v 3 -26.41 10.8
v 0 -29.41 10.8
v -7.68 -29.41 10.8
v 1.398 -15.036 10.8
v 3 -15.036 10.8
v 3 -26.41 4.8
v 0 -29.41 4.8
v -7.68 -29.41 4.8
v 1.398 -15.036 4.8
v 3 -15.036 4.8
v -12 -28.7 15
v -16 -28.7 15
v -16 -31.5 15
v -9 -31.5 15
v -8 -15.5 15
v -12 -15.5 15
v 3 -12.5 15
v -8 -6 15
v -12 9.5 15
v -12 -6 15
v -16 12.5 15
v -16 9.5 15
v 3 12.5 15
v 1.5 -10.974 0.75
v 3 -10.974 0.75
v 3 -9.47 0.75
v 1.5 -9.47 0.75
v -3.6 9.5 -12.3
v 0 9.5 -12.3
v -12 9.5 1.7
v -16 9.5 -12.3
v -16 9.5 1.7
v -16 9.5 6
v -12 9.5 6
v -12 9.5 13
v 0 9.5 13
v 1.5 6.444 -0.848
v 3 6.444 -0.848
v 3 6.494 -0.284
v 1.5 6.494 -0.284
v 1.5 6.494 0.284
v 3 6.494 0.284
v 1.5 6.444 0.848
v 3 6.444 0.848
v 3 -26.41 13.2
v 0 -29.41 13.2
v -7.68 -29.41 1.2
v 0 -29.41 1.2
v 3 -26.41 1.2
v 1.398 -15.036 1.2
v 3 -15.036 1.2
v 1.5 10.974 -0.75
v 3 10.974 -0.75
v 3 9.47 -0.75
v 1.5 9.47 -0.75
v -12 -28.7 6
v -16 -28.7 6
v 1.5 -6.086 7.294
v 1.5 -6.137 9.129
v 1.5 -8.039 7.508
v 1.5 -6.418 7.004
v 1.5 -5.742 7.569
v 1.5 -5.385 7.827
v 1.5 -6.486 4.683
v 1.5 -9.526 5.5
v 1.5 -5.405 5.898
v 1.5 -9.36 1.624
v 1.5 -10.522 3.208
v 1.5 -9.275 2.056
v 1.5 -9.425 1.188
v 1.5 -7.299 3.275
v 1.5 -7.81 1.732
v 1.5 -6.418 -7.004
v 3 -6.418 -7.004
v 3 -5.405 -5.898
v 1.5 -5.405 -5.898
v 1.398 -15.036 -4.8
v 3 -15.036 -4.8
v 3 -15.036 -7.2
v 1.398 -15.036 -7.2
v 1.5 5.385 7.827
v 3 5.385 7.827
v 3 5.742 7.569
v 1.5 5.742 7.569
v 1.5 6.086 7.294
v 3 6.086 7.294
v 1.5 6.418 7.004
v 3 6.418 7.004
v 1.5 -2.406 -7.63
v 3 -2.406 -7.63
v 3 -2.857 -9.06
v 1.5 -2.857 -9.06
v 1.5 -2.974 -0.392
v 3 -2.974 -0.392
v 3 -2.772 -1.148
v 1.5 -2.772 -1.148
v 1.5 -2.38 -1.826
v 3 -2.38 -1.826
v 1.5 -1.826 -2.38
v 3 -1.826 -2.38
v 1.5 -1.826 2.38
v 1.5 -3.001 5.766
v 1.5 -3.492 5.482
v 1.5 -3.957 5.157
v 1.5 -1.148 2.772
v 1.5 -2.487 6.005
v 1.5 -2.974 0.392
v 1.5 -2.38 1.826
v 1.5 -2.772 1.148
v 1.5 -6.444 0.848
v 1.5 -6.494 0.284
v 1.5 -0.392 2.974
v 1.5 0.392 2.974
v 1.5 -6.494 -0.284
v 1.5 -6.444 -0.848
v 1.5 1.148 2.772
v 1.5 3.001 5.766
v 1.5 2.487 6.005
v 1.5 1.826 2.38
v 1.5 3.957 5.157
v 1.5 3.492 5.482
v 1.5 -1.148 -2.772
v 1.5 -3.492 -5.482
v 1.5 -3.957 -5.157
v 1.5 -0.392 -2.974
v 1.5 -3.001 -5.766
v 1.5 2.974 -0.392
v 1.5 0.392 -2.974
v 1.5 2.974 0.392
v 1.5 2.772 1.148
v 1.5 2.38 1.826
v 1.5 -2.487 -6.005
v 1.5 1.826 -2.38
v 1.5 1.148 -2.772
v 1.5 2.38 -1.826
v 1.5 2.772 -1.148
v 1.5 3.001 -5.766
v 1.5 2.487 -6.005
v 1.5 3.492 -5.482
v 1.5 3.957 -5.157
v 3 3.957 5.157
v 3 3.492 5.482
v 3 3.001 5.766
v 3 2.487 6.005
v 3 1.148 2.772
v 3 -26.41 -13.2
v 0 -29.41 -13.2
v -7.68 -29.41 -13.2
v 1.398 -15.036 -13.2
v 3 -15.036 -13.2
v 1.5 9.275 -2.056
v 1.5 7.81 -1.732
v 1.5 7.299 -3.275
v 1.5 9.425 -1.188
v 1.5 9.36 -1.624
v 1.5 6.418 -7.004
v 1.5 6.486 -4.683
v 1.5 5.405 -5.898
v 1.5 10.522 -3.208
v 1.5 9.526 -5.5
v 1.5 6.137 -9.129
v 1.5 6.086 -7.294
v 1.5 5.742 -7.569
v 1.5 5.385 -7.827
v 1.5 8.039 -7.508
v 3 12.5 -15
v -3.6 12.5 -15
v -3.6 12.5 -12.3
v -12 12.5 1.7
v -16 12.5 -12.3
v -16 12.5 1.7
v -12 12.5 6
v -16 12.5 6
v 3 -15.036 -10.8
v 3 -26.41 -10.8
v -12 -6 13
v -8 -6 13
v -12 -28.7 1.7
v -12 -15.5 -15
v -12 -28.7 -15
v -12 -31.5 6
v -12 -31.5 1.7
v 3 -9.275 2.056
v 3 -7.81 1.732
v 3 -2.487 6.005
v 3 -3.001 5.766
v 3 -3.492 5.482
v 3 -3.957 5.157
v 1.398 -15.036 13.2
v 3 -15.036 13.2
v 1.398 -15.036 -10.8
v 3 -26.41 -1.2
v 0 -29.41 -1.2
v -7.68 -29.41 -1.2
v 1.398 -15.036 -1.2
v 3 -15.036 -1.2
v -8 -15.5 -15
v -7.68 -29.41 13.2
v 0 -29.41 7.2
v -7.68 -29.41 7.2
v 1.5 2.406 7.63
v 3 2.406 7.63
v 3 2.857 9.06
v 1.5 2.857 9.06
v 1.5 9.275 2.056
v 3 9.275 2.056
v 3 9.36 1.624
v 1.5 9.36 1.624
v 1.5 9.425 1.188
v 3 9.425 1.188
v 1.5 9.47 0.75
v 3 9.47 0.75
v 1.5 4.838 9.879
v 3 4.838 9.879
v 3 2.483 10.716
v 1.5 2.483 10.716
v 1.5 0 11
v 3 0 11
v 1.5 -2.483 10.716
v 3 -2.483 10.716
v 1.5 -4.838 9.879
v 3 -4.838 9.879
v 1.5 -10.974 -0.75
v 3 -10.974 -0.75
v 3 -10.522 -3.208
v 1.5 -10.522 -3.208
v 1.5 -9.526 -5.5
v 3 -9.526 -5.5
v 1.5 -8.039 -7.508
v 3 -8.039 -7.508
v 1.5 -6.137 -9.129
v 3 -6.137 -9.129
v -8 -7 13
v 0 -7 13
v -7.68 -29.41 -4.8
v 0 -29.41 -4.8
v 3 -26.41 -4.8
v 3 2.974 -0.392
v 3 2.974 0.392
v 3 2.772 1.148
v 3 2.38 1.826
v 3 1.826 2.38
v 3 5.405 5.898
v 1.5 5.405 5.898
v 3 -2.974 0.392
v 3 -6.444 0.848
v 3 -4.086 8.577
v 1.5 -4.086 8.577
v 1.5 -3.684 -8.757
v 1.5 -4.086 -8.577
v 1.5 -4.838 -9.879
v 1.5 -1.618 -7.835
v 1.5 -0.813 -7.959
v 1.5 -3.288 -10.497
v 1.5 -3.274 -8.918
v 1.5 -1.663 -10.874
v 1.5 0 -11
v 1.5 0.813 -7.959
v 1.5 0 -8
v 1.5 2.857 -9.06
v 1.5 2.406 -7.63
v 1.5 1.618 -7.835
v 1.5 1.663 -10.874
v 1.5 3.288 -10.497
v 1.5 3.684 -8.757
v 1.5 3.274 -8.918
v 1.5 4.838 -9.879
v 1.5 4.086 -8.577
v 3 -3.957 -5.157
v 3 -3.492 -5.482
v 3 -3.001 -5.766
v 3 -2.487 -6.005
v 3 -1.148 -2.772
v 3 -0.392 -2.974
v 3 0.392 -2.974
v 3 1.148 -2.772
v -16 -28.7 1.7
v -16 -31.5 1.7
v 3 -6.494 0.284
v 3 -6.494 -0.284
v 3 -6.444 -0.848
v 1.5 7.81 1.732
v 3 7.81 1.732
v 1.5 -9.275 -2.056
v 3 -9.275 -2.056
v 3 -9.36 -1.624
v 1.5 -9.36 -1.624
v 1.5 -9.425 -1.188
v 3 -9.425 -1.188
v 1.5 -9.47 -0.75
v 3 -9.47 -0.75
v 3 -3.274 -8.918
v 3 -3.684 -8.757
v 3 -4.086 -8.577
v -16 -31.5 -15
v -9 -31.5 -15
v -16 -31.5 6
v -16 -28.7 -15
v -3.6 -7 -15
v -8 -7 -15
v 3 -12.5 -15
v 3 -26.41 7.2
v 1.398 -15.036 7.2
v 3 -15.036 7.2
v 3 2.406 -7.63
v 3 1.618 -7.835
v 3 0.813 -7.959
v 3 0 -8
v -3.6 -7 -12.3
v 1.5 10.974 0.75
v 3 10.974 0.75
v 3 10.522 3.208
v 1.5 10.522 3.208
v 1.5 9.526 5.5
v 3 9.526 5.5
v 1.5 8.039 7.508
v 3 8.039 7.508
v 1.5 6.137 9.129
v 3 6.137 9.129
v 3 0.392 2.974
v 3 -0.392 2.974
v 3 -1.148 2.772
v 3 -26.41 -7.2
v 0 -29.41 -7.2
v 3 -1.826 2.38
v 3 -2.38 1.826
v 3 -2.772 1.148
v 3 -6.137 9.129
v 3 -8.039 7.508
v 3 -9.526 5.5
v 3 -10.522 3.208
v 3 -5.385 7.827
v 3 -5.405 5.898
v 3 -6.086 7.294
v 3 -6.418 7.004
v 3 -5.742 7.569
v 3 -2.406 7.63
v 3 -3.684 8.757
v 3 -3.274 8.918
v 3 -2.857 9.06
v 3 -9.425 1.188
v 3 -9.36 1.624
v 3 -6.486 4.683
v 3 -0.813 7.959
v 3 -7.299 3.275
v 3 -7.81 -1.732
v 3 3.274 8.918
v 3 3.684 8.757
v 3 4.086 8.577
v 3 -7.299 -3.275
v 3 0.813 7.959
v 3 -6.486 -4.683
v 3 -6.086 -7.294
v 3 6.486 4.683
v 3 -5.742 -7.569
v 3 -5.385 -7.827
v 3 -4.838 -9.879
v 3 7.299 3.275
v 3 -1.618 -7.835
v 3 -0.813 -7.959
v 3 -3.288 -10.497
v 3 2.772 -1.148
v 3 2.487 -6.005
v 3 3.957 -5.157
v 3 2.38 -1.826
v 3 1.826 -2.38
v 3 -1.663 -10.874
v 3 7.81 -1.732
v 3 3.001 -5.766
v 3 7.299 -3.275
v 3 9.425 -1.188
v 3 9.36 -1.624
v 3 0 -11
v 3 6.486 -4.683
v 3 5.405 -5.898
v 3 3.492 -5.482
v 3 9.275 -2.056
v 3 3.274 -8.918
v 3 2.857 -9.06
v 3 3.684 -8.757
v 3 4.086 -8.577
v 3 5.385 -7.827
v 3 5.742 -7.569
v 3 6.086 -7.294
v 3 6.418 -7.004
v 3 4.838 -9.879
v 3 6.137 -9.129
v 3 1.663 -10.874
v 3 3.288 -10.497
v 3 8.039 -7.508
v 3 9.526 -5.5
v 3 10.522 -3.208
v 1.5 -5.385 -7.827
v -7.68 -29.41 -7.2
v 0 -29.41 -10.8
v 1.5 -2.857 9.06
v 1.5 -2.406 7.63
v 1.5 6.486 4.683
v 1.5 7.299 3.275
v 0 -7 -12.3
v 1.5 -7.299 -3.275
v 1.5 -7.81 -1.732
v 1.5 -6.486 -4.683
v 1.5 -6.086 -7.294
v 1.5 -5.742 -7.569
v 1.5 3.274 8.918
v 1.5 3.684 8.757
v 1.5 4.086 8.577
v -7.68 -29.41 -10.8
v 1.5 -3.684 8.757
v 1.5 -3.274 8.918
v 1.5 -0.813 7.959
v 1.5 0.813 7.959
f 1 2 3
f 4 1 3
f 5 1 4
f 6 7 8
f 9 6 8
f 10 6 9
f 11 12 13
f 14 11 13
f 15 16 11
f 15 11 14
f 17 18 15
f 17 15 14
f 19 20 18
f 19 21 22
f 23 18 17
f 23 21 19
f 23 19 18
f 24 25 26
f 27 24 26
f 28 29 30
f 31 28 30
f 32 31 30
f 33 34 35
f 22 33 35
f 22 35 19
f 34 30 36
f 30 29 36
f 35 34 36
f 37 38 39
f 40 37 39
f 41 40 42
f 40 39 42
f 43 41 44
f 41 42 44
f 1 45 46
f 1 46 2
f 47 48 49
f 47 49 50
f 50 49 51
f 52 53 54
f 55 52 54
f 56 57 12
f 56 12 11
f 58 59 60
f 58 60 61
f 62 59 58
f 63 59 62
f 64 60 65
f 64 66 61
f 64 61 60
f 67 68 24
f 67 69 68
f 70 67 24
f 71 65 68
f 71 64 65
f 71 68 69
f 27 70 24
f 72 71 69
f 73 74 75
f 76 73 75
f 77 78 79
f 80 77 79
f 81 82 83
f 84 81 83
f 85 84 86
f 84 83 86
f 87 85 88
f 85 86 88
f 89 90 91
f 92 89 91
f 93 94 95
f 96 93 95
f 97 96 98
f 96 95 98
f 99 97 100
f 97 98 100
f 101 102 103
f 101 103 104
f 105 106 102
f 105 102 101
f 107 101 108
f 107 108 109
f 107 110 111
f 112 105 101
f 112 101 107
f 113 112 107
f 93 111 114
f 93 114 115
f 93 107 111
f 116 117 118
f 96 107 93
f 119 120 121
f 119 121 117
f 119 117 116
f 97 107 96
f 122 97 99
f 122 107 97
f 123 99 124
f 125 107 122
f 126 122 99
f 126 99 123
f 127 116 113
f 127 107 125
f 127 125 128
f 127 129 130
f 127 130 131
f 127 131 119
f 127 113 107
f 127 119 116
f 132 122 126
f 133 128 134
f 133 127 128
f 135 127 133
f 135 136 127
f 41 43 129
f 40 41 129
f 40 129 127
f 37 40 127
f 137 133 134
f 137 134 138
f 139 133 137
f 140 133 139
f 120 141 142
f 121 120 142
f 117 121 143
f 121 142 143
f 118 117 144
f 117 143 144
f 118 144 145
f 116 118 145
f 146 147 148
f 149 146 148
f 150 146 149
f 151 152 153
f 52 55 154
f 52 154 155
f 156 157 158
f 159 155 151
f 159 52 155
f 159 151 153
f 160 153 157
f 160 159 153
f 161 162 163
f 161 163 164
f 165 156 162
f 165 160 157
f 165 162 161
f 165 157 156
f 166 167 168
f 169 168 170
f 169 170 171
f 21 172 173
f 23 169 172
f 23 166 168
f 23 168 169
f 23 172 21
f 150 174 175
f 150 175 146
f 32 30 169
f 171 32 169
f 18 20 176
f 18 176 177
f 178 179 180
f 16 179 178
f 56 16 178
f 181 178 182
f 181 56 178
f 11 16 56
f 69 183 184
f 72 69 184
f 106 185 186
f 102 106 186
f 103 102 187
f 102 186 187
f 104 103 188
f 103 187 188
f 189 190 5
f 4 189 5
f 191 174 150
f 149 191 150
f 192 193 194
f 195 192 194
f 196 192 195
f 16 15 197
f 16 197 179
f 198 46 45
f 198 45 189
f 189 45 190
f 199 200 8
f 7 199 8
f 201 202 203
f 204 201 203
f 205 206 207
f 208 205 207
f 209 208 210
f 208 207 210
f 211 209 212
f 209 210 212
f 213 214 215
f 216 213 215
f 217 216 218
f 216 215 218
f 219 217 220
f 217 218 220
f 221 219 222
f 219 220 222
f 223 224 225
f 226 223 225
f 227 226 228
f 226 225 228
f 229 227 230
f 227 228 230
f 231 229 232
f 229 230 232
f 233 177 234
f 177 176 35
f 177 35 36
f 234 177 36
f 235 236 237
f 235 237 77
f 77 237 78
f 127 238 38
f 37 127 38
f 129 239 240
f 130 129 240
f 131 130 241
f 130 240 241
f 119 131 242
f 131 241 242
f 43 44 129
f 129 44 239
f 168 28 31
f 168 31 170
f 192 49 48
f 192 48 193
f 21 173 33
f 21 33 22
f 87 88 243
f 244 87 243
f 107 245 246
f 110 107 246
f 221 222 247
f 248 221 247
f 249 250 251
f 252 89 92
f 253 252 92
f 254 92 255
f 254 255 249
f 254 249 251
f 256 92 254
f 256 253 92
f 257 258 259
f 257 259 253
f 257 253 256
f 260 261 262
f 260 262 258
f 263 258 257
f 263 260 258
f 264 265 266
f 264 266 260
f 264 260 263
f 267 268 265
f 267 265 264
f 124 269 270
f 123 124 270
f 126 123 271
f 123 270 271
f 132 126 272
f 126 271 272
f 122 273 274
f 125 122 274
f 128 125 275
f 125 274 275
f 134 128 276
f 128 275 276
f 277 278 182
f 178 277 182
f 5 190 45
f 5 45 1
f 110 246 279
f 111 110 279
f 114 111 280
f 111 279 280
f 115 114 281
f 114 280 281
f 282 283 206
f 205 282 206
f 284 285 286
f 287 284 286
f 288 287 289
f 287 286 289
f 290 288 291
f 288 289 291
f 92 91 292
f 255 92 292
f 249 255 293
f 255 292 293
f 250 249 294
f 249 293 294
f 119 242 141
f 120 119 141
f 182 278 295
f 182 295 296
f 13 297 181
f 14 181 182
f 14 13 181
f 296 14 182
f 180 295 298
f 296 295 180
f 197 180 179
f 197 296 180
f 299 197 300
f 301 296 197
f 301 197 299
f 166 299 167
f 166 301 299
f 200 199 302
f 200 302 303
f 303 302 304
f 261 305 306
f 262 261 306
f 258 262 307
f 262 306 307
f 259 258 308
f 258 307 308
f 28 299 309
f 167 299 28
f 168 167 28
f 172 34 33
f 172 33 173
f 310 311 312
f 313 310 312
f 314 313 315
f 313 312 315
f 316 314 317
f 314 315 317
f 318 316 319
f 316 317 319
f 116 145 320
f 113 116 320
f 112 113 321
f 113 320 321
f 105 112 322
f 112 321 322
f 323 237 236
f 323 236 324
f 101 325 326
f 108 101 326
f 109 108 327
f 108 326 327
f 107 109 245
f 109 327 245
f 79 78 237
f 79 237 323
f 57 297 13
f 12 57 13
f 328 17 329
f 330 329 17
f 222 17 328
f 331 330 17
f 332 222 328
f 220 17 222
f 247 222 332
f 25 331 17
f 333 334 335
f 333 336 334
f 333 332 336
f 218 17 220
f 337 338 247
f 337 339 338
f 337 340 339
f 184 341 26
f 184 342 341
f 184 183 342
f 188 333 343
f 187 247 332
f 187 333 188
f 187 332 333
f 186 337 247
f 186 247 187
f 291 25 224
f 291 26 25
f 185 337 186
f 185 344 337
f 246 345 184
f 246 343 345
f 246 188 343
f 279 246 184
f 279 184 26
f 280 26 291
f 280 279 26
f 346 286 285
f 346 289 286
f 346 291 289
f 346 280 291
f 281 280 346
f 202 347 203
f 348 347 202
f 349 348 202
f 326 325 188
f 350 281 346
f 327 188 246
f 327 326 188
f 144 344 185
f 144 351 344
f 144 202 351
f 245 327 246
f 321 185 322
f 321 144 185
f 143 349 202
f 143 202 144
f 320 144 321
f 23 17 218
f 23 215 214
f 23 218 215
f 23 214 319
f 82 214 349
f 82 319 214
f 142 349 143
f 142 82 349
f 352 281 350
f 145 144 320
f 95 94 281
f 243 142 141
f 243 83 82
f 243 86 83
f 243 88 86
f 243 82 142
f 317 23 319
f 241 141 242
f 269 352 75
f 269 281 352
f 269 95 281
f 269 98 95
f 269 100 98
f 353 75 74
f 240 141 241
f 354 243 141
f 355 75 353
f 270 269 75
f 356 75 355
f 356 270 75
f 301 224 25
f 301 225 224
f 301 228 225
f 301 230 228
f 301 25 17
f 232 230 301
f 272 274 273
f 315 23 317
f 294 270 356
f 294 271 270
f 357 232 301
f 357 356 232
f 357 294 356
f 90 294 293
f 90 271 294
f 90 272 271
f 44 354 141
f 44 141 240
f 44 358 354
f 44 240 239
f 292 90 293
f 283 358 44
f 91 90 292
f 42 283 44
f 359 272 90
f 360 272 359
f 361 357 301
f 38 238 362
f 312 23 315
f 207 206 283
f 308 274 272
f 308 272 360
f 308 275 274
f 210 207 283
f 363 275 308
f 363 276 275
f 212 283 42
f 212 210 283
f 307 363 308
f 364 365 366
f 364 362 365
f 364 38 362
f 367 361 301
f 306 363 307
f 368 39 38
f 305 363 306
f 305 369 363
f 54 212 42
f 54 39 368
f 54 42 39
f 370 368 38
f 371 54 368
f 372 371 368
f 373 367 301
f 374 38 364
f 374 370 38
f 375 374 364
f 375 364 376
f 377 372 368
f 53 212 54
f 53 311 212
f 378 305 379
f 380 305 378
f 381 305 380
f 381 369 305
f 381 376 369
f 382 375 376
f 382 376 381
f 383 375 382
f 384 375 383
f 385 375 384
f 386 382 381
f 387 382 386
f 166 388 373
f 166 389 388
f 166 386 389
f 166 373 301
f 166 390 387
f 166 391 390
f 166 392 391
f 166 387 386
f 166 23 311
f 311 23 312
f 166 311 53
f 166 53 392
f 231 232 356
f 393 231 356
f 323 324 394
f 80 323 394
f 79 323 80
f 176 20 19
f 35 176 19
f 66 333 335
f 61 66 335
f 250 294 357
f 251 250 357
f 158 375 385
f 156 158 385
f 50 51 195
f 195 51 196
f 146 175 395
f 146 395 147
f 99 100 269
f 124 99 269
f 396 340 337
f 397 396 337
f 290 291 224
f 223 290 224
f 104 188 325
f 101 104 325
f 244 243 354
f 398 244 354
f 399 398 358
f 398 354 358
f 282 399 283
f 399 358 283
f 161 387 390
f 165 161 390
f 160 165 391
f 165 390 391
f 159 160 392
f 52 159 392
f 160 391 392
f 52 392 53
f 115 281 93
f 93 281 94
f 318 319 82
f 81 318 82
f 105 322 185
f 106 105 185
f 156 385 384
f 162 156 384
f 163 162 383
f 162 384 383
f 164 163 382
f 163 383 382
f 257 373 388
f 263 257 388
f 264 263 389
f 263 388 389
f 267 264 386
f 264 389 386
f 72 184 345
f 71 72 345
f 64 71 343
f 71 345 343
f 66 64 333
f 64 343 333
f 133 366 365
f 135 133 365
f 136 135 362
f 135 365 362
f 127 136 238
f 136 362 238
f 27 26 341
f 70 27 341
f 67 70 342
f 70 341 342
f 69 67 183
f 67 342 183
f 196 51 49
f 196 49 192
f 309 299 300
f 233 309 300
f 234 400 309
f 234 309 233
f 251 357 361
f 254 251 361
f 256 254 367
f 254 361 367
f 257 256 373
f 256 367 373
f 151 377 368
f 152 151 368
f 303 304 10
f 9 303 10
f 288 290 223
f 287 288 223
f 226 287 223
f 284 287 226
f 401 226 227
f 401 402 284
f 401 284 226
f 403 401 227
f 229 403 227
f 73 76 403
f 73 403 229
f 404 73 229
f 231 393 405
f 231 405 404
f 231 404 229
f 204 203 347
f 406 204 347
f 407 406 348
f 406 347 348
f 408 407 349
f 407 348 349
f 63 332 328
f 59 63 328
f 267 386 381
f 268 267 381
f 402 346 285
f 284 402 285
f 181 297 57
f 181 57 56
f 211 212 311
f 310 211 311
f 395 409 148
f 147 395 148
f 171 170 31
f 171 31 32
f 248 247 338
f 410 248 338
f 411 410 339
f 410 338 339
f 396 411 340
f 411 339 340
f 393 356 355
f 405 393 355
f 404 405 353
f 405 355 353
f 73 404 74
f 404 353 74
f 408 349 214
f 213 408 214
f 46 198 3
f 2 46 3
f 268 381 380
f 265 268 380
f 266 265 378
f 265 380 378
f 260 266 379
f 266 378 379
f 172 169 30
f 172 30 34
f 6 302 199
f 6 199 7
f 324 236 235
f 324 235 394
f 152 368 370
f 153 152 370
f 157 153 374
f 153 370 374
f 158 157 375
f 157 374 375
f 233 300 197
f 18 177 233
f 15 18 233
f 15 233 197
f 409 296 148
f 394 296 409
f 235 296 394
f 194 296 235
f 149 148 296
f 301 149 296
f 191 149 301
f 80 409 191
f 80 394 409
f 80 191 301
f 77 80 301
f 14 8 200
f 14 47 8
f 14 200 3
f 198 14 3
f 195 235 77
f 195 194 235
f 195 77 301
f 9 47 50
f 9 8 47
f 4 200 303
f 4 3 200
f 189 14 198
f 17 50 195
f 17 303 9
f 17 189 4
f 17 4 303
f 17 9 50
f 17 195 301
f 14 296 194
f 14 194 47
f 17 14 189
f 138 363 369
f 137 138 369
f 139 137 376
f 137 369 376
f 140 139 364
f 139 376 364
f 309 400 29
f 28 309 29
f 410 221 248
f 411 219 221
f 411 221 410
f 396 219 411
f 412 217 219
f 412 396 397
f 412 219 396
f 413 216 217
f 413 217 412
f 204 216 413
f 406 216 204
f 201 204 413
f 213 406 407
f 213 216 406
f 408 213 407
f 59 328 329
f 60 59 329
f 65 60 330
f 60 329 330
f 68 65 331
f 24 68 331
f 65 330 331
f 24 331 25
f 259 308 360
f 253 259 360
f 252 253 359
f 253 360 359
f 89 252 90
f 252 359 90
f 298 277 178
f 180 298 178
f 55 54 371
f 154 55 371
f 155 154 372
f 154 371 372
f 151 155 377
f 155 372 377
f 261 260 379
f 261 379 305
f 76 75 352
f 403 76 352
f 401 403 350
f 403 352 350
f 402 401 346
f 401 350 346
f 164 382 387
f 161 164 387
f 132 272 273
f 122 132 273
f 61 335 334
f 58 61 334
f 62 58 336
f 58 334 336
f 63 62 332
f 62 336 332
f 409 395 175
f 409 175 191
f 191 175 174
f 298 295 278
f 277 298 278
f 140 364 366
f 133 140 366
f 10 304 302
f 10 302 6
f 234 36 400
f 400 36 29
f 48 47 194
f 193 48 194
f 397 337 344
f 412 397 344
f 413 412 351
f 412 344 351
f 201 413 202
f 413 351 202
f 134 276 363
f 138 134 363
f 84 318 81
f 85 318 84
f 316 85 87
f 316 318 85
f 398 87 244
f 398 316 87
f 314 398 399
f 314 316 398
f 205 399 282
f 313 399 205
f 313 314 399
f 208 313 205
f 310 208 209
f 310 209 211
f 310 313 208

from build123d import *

# Parameters (mm, degrees)
SKETCH1_W           = 30
SKETCH1_H           = 25
BOSS_EXTRUDE1_DEPTH = 3
SKETCH2_W           = 9
SKETCH2_H           = 3
SKETCH2_W_2         = 14
BOSS_EXTRUDE2_DEPTH = 16
SKETCH3_W           = 4.3
SKETCH3_H           = 3
BOSS_EXTRUDE3_DEPTH = 12
SKETCH4_W           = 30
SKETCH4_H           = 5.5
BOSS_EXTRUDE4_DEPTH = 8
BOSS_EXTRUDE5_DEPTH = 30
SKETCH7_W           = 4
SKETCH7_H           = 9
SKETCH7_H_2         = 16.7
BOSS_EXTRUDE6_DEPTH = 3
SKETCH9_W           = 12
SKETCH9_H           = 16.5
BOSS_EXTRUDE7_DEPTH = 2
BOSS_EXTRUDE8_REACH = 41.727
SKETCH11_W          = 2.4
SKETCH11_H          = 14.373311352
CHAMFER1_SIZE       = 3
SKETCH12_R          = 3
CUT_EXTRUDE1_DEPTH  = 1.5
SKETCH13_W          = 2.7
SKETCH13_H          = 19.5
BOSS_EXTRUDE9_DEPTH = 3.6
SKETCH14_W          = 4
SKETCH14_H          = 1
SKETCH14_H_2        = 0.2
CUT_EXTRUDE2_DEPTH  = 47.349217901


with BuildPart() as part:
    # Sketch1 → Boss-Extrude1 (new body)
    with BuildSketch(Plane(origin=(0, 0, 0), x_dir=(0, 0, -1), z_dir=(1, 0, 0))):
        Rectangle(SKETCH1_W, SKETCH1_H)
    extrude(amount=BOSS_EXTRUDE1_DEPTH)

    # Sketch2 → Boss-Extrude2 (add)
    with BuildSketch(Plane.ZY):
        with Locations((10.5, 11)):
            Rectangle(SKETCH2_W, SKETCH2_H)
        with Locations((-5.3, 11)):
            Rectangle(SKETCH2_W_2, SKETCH2_H)
    extrude(amount=BOSS_EXTRUDE2_DEPTH)

    # Sketch3 → Boss-Extrude3 (add)
    with BuildSketch(Plane.ZY):
        with Locations((3.85, 11)):
            Rectangle(SKETCH3_W, SKETCH3_H)
    extrude(amount=BOSS_EXTRUDE3_DEPTH)

    # Sketch4 → Boss-Extrude4 (add)
    with BuildSketch(Plane.ZY):
        with Locations((0, -9.75)):
            Rectangle(SKETCH4_W, SKETCH4_H)
    extrude(amount=BOSS_EXTRUDE4_DEPTH)

    # Sketch5 → Boss-Extrude5 (add)
    with BuildSketch(Plane.XY.offset(15)):
        Polygon((-12, -31.5), (-9, -31.5), (3, -12.5), (-8, -12.5), (-8, -15.5), (-12, -15.5), align=None)
    extrude(amount=-BOSS_EXTRUDE5_DEPTH)

    # Sketch7 → Boss-Extrude6 (add)
    with BuildSketch(Plane.XZ.offset(31.5)):
        with Locations((-14, 10.5)):
            Rectangle(SKETCH7_W, SKETCH7_H)
        with Locations((-14, -6.65)):
            Rectangle(SKETCH7_W, SKETCH7_H_2)
    extrude(amount=-BOSS_EXTRUDE6_DEPTH)

    # Sketch9 → Boss-Extrude7 (add)
    with BuildSketch(Plane.XY.offset(15)):
        with Locations((-6, 1.25)):
            Rectangle(SKETCH9_W, SKETCH9_H)
    extrude(amount=-BOSS_EXTRUDE7_DEPTH)

    # Boss-Extrude8: up to this plane
    boss_extrude8_end = Plane(origin=(-9, -31.5, -39.207436874), z_dir=(0.8454889030309711, -0.5339929913879816, 0))
    # Sketch11 → Boss-Extrude8 (add, up to the surface)
    with BuildSketch(Plane(origin=(3, 0, 0), x_dir=(0, 0, -1), z_dir=(1, 0, 0)), mode=Mode.PRIVATE) as boss_extrude8_sk1:
        with Locations((-12, -22.223122385)):
            Rectangle(SKETCH11_W, SKETCH11_H)
    boss_extrude8_tool1 = split(extrude(boss_extrude8_sk1.sketch, amount=-BOSS_EXTRUDE8_REACH, mode=Mode.PRIVATE), bisect_by=boss_extrude8_end, keep=Keep.BOTH, mode=Mode.PRIVATE)
    add(boss_extrude8_tool1.solids().sort_by_distance((3, -22.223122, 12))[0])
    # Sketch11 → Boss-Extrude8 (add, up to the surface)
    with BuildSketch(Plane(origin=(3, 0, 0), x_dir=(0, 0, -1), z_dir=(1, 0, 0)), mode=Mode.PRIVATE) as boss_extrude8_sk2:
        with Locations((-6, -22.223122385)):
            Rectangle(SKETCH11_W, SKETCH11_H)
    boss_extrude8_tool2 = split(extrude(boss_extrude8_sk2.sketch, amount=-BOSS_EXTRUDE8_REACH, mode=Mode.PRIVATE), bisect_by=boss_extrude8_end, keep=Keep.BOTH, mode=Mode.PRIVATE)
    add(boss_extrude8_tool2.solids().sort_by_distance((3, -22.223122, 6))[0])
    # Sketch11 → Boss-Extrude8 (add, up to the surface)
    with BuildSketch(Plane(origin=(3, 0, 0), x_dir=(0, 0, -1), z_dir=(1, 0, 0)), mode=Mode.PRIVATE) as boss_extrude8_sk3:
        with Locations((0, -22.223122385)):
            Rectangle(SKETCH11_W, SKETCH11_H)
    boss_extrude8_tool3 = split(extrude(boss_extrude8_sk3.sketch, amount=-BOSS_EXTRUDE8_REACH, mode=Mode.PRIVATE), bisect_by=boss_extrude8_end, keep=Keep.BOTH, mode=Mode.PRIVATE)
    add(boss_extrude8_tool3.solids().sort_by_distance((3, -22.223122, 0))[0])
    # Sketch11 → Boss-Extrude8 (add, up to the surface)
    with BuildSketch(Plane(origin=(3, 0, 0), x_dir=(0, 0, -1), z_dir=(1, 0, 0)), mode=Mode.PRIVATE) as boss_extrude8_sk4:
        with Locations((6, -22.223122385)):
            Rectangle(SKETCH11_W, SKETCH11_H)
    boss_extrude8_tool4 = split(extrude(boss_extrude8_sk4.sketch, amount=-BOSS_EXTRUDE8_REACH, mode=Mode.PRIVATE), bisect_by=boss_extrude8_end, keep=Keep.BOTH, mode=Mode.PRIVATE)
    add(boss_extrude8_tool4.solids().sort_by_distance((3, -22.223122, -6))[0])
    # Sketch11 → Boss-Extrude8 (add, up to the surface)
    with BuildSketch(Plane(origin=(3, 0, 0), x_dir=(0, 0, -1), z_dir=(1, 0, 0)), mode=Mode.PRIVATE) as boss_extrude8_sk5:
        with Locations((12, -22.223122385)):
            Rectangle(SKETCH11_W, SKETCH11_H)
    boss_extrude8_tool5 = split(extrude(boss_extrude8_sk5.sketch, amount=-BOSS_EXTRUDE8_REACH, mode=Mode.PRIVATE), bisect_by=boss_extrude8_end, keep=Keep.BOTH, mode=Mode.PRIVATE)
    add(boss_extrude8_tool5.solids().sort_by_distance((3, -22.223122, -12))[0])

    # Chamfer1
    chamfer1_edges = [part.edges().sort_by_distance(p)[0] for p in [
        (3, -29.409778061, 12),
        (3, -29.409778061, 6),
        (3, -29.409778061, 0),
        (3, -29.409778061, -6),
        (3, -29.409778061, -12),
    ]]
    chamfer(chamfer1_edges, length=CHAMFER1_SIZE)

    # Sketch12 → Cut-Extrude1 (cut)
    with BuildSketch(Plane(origin=(3, 0, 0), x_dir=(0, 0, -1), z_dir=(1, 0, 0))):
        with BuildLine():
            Line((-0.75, 9.470348462), (-0.75, 10.974402034))
            ThreePointArc((-0.75, 10.974402034), (-5.5, 9.526279442), (-9.129110953, 6.13672007))
            Line((-9.129110953, 6.13672007), (-7.826562351, 5.384693284))
            ThreePointArc((-7.826562351, 5.384693284), (-7.433328979, 5.915709618), (-7.0041347, 6.418106972))
            ThreePointArc((-7.0041347, 6.418106972), (-4.75, 8.227241336), (-2.056176332, 9.274812068))
            ThreePointArc((-2.056176332, 9.274812068), (-1.406490321, 9.39530654), (-0.75, 9.470348462))
        make_face()
        with BuildLine():
            Line((-8.576562351, 4.085655178), (-9.879110953, 4.837681964))
            ThreePointArc((-9.879110953, 4.837681964), (-11, 0), (-9.879110953, -4.837681964))
            Line((-9.879110953, -4.837681964), (-8.576562351, -4.085655178))
            ThreePointArc((-8.576562351, -4.085655178), (-8.8398193, -3.479596922), (-9.060311032, -2.856705095))
            ThreePointArc((-9.060311032, -2.856705095), (-9.5, 0), (-9.060311032, 2.856705095))
            ThreePointArc((-9.060311032, 2.856705095), (-8.8398193, 3.479596922), (-8.576562351, 4.085655178))
        make_face()
        with BuildLine():
            Line((-7.826562351, -5.384693284), (-9.129110953, -6.13672007))
            ThreePointArc((-9.129110953, -6.13672007), (-5.5, -9.526279442), (-0.75, -10.974402034))
            Line((-0.75, -10.974402034), (-0.75, -9.470348462))
            ThreePointArc((-0.75, -9.470348462), (-1.406490321, -9.39530654), (-2.056176332, -9.274812068))
            ThreePointArc((-2.056176332, -9.274812068), (-4.75, -8.227241336), (-7.0041347, -6.418106972))
            ThreePointArc((-7.0041347, -6.418106972), (-7.433328979, -5.915709618), (-7.826562351, -5.384693284))
        make_face()
        with BuildLine():
            ThreePointArc((0.75, -10.974402034), (5.5, -9.526279442), (9.129110953, -6.13672007))
            Line((9.129110953, -6.13672007), (7.826562351, -5.384693284))
            ThreePointArc((7.826562351, -5.384693284), (7.433328979, -5.915709618), (7.0041347, -6.418106972))
            ThreePointArc((7.0041347, -6.418106972), (4.75, -8.227241336), (2.056176332, -9.274812068))
            ThreePointArc((2.056176332, -9.274812068), (1.406490321, -9.39530654), (0.75, -9.470348462))
            Line((0.75, -9.470348462), (0.75, -10.974402034))
        make_face()
        with BuildLine():
            ThreePointArc((11, 0), (10.716114512, 2.482919604), (9.879110953, 4.837681964))
            Line((9.879110953, 4.837681964), (8.576562351, 4.085655178))
            ThreePointArc((8.576562351, 4.085655178), (8.8398193, 3.479596922), (9.060311032, 2.856705095))
            ThreePointArc((9.060311032, 2.856705095), (9.389434349, 1.445172169), (9.5, 0))
            ThreePointArc((9.5, 0), (9.389434349, -1.445172169), (9.060311032, -2.856705095))
            ThreePointArc((9.060311032, -2.856705095), (8.8398193, -3.479596922), (8.576562351, -4.085655178))
            Line((8.576562351, -4.085655178), (9.879110953, -4.837681964))
            ThreePointArc((9.879110953, -4.837681964), (10.716114512, -2.482919604), (11, 0))
        make_face()
        with BuildLine():
            ThreePointArc((9.129110953, 6.13672007), (5.5, 9.526279442), (0.75, 10.974402034))
            Line((0.75, 10.974402034), (0.75, 9.470348462))
            ThreePointArc((0.75, 9.470348462), (1.406490321, 9.39530654), (2.056176332, 9.274812068))
            ThreePointArc((2.056176332, 9.274812068), (4.75, 8.227241336), (7.0041347, 6.418106972))
            ThreePointArc((7.0041347, 6.418106972), (7.433328979, 5.915709618), (7.826562351, 5.384693284))
            Line((7.826562351, 5.384693284), (9.129110953, 6.13672007))
        make_face()
        with BuildLine():
            Line((-1.731516912, 7.810368057), (-2.056176332, 9.274812068))
            ThreePointArc((-2.056176332, 9.274812068), (-4.75, 8.227241336), (-7.0041347, 6.418106972))
            Line((-7.0041347, 6.418106972), (-5.898218694, 5.404721661))
            ThreePointArc((-5.898218694, 5.404721661), (-4, 6.92820323), (-1.731516912, 7.810368057))
        make_face()
        with BuildLine():
            Line((-7.629735606, 2.405646396), (-9.060311032, 2.856705095))
            ThreePointArc((-9.060311032, 2.856705095), (-9.5, 0), (-9.060311032, -2.856705095))
            Line((-9.060311032, -2.856705095), (-7.629735606, -2.405646396))
            ThreePointArc((-7.629735606, -2.405646396), (-8, 0), (-7.629735606, 2.405646396))
        make_face()
        with BuildLine():
            Line((-5.898218694, -5.404721661), (-7.0041347, -6.418106972))
            ThreePointArc((-7.0041347, -6.418106972), (-4.75, -8.227241336), (-2.056176332, -9.274812068))
            Line((-2.056176332, -9.274812068), (-1.731516912, -7.810368057))
            ThreePointArc((-1.731516912, -7.810368057), (-4, -6.92820323), (-5.898218694, -5.404721661))
        make_face()
        with BuildLine():
            ThreePointArc((2.056176332, -9.274812068), (4.75, -8.227241336), (7.0041347, -6.418106972))
            Line((7.0041347, -6.418106972), (5.898218694, -5.404721661))
            ThreePointArc((5.898218694, -5.404721661), (4, -6.92820323), (1.731516912, -7.810368057))
            Line((1.731516912, -7.810368057), (2.056176332, -9.274812068))
        make_face()
        with BuildLine():
            ThreePointArc((9.5, 0), (9.389434349, 1.445172169), (9.060311032, 2.856705095))
            Line((9.060311032, 2.856705095), (7.629735606, 2.405646396))
            ThreePointArc((7.629735606, 2.405646396), (7.906892084, 1.21698709), (8, 0))
            ThreePointArc((8, 0), (7.906892084, -1.21698709), (7.629735606, -2.405646396))
            Line((7.629735606, -2.405646396), (9.060311032, -2.856705095))
            ThreePointArc((9.060311032, -2.856705095), (9.389434349, -1.445172169), (9.5, 0))
        make_face()
        with BuildLine():
            ThreePointArc((7.0041347, 6.418106972), (4.75, 8.227241336), (2.056176332, 9.274812068))
            Line((2.056176332, 9.274812068), (1.731516912, 7.810368057))
            ThreePointArc((1.731516912, 7.810368057), (4, 6.92820323), (5.898218694, 5.404721661))
            Line((5.898218694, 5.404721661), (7.0041347, 6.418106972))
        make_face()
        with BuildLine():
            Line((-2.380060021, 1.826284287), (-5.156796712, 3.956949289))
            ThreePointArc((-5.156796712, 3.956949289), (-5.629165125, 3.25), (-6.005216961, 2.48744231))
            Line((-6.005216961, 2.48744231), (-2.771638598, 1.148050297))
            ThreePointArc((-2.771638598, 1.148050297), (-2.598076211, 1.5), (-2.380060021, 1.826284287))
        make_face()
        with BuildLine():
            Line((-2.771638598, -1.148050297), (-6.005216961, -2.48744231))
            ThreePointArc((-6.005216961, -2.48744231), (-5.629165125, -3.25), (-5.156796712, -3.956949289))
            Line((-5.156796712, -3.956949289), (-2.380060021, -1.826284287))
            ThreePointArc((-2.380060021, -1.826284287), (-2.598076211, -1.5), (-2.771638598, -1.148050297))
        make_face()
        with BuildLine():
            Line((-0.391578577, -2.974334584), (-0.848420249, -6.444391599))
            ThreePointArc((-0.848420249, -6.444391599), (0, -6.5), (0.848420249, -6.444391599))
            Line((0.848420249, -6.444391599), (0.391578577, -2.974334584))
            ThreePointArc((0.391578577, -2.974334584), (0, -3), (-0.391578577, -2.974334584))
        make_face()
        with BuildLine():
            ThreePointArc((5.156796712, -3.956949289), (5.629165125, -3.25), (6.005216961, -2.48744231))
            Line((6.005216961, -2.48744231), (2.771638598, -1.148050297))
            ThreePointArc((2.771638598, -1.148050297), (2.598076211, -1.5), (2.380060021, -1.826284287))
            Line((2.380060021, -1.826284287), (5.156796712, -3.956949289))
        make_face()
        with BuildLine():
            ThreePointArc((6.005216961, 2.48744231), (5.629165125, 3.25), (5.156796712, 3.956949289))
            Line((5.156796712, 3.956949289), (2.380060021, 1.826284287))
            ThreePointArc((2.380060021, 1.826284287), (2.598076211, 1.5), (2.771638598, 1.148050297))
            Line((2.771638598, 1.148050297), (6.005216961, 2.48744231))
        make_face()
        with BuildLine():
            ThreePointArc((0.848420249, 6.444391599), (0, 6.5), (-0.848420249, 6.444391599))
            Line((-0.848420249, 6.444391599), (-0.391578577, 2.974334584))
            ThreePointArc((-0.391578577, 2.974334584), (0, 3), (0.391578577, 2.974334584))
            Line((0.391578577, 2.974334584), (0.848420249, 6.444391599))
        make_face()
        Circle(SKETCH12_R)
    extrude(amount=-CUT_EXTRUDE1_DEPTH, mode=Mode.SUBTRACT)

    # Sketch13 → Boss-Extrude9 (add)
    with BuildSketch(Plane.ZY):
        with Locations((-13.65, 2.75)):
            Rectangle(SKETCH13_W, SKETCH13_H)
    extrude(amount=BOSS_EXTRUDE9_DEPTH)

    # Sketch14 → Cut-Extrude2 (cut, through all)
    with BuildSketch(Plane.XY.offset(15)):
        with Locations((-10, -6.5)):
            Rectangle(SKETCH14_W, SKETCH14_H)
        with Locations((-14, -28.6)):
            Rectangle(SKETCH14_W, SKETCH14_H_2)
    extrude(amount=-CUT_EXTRUDE2_DEPTH, mode=Mode.SUBTRACT)


solid = part.part
